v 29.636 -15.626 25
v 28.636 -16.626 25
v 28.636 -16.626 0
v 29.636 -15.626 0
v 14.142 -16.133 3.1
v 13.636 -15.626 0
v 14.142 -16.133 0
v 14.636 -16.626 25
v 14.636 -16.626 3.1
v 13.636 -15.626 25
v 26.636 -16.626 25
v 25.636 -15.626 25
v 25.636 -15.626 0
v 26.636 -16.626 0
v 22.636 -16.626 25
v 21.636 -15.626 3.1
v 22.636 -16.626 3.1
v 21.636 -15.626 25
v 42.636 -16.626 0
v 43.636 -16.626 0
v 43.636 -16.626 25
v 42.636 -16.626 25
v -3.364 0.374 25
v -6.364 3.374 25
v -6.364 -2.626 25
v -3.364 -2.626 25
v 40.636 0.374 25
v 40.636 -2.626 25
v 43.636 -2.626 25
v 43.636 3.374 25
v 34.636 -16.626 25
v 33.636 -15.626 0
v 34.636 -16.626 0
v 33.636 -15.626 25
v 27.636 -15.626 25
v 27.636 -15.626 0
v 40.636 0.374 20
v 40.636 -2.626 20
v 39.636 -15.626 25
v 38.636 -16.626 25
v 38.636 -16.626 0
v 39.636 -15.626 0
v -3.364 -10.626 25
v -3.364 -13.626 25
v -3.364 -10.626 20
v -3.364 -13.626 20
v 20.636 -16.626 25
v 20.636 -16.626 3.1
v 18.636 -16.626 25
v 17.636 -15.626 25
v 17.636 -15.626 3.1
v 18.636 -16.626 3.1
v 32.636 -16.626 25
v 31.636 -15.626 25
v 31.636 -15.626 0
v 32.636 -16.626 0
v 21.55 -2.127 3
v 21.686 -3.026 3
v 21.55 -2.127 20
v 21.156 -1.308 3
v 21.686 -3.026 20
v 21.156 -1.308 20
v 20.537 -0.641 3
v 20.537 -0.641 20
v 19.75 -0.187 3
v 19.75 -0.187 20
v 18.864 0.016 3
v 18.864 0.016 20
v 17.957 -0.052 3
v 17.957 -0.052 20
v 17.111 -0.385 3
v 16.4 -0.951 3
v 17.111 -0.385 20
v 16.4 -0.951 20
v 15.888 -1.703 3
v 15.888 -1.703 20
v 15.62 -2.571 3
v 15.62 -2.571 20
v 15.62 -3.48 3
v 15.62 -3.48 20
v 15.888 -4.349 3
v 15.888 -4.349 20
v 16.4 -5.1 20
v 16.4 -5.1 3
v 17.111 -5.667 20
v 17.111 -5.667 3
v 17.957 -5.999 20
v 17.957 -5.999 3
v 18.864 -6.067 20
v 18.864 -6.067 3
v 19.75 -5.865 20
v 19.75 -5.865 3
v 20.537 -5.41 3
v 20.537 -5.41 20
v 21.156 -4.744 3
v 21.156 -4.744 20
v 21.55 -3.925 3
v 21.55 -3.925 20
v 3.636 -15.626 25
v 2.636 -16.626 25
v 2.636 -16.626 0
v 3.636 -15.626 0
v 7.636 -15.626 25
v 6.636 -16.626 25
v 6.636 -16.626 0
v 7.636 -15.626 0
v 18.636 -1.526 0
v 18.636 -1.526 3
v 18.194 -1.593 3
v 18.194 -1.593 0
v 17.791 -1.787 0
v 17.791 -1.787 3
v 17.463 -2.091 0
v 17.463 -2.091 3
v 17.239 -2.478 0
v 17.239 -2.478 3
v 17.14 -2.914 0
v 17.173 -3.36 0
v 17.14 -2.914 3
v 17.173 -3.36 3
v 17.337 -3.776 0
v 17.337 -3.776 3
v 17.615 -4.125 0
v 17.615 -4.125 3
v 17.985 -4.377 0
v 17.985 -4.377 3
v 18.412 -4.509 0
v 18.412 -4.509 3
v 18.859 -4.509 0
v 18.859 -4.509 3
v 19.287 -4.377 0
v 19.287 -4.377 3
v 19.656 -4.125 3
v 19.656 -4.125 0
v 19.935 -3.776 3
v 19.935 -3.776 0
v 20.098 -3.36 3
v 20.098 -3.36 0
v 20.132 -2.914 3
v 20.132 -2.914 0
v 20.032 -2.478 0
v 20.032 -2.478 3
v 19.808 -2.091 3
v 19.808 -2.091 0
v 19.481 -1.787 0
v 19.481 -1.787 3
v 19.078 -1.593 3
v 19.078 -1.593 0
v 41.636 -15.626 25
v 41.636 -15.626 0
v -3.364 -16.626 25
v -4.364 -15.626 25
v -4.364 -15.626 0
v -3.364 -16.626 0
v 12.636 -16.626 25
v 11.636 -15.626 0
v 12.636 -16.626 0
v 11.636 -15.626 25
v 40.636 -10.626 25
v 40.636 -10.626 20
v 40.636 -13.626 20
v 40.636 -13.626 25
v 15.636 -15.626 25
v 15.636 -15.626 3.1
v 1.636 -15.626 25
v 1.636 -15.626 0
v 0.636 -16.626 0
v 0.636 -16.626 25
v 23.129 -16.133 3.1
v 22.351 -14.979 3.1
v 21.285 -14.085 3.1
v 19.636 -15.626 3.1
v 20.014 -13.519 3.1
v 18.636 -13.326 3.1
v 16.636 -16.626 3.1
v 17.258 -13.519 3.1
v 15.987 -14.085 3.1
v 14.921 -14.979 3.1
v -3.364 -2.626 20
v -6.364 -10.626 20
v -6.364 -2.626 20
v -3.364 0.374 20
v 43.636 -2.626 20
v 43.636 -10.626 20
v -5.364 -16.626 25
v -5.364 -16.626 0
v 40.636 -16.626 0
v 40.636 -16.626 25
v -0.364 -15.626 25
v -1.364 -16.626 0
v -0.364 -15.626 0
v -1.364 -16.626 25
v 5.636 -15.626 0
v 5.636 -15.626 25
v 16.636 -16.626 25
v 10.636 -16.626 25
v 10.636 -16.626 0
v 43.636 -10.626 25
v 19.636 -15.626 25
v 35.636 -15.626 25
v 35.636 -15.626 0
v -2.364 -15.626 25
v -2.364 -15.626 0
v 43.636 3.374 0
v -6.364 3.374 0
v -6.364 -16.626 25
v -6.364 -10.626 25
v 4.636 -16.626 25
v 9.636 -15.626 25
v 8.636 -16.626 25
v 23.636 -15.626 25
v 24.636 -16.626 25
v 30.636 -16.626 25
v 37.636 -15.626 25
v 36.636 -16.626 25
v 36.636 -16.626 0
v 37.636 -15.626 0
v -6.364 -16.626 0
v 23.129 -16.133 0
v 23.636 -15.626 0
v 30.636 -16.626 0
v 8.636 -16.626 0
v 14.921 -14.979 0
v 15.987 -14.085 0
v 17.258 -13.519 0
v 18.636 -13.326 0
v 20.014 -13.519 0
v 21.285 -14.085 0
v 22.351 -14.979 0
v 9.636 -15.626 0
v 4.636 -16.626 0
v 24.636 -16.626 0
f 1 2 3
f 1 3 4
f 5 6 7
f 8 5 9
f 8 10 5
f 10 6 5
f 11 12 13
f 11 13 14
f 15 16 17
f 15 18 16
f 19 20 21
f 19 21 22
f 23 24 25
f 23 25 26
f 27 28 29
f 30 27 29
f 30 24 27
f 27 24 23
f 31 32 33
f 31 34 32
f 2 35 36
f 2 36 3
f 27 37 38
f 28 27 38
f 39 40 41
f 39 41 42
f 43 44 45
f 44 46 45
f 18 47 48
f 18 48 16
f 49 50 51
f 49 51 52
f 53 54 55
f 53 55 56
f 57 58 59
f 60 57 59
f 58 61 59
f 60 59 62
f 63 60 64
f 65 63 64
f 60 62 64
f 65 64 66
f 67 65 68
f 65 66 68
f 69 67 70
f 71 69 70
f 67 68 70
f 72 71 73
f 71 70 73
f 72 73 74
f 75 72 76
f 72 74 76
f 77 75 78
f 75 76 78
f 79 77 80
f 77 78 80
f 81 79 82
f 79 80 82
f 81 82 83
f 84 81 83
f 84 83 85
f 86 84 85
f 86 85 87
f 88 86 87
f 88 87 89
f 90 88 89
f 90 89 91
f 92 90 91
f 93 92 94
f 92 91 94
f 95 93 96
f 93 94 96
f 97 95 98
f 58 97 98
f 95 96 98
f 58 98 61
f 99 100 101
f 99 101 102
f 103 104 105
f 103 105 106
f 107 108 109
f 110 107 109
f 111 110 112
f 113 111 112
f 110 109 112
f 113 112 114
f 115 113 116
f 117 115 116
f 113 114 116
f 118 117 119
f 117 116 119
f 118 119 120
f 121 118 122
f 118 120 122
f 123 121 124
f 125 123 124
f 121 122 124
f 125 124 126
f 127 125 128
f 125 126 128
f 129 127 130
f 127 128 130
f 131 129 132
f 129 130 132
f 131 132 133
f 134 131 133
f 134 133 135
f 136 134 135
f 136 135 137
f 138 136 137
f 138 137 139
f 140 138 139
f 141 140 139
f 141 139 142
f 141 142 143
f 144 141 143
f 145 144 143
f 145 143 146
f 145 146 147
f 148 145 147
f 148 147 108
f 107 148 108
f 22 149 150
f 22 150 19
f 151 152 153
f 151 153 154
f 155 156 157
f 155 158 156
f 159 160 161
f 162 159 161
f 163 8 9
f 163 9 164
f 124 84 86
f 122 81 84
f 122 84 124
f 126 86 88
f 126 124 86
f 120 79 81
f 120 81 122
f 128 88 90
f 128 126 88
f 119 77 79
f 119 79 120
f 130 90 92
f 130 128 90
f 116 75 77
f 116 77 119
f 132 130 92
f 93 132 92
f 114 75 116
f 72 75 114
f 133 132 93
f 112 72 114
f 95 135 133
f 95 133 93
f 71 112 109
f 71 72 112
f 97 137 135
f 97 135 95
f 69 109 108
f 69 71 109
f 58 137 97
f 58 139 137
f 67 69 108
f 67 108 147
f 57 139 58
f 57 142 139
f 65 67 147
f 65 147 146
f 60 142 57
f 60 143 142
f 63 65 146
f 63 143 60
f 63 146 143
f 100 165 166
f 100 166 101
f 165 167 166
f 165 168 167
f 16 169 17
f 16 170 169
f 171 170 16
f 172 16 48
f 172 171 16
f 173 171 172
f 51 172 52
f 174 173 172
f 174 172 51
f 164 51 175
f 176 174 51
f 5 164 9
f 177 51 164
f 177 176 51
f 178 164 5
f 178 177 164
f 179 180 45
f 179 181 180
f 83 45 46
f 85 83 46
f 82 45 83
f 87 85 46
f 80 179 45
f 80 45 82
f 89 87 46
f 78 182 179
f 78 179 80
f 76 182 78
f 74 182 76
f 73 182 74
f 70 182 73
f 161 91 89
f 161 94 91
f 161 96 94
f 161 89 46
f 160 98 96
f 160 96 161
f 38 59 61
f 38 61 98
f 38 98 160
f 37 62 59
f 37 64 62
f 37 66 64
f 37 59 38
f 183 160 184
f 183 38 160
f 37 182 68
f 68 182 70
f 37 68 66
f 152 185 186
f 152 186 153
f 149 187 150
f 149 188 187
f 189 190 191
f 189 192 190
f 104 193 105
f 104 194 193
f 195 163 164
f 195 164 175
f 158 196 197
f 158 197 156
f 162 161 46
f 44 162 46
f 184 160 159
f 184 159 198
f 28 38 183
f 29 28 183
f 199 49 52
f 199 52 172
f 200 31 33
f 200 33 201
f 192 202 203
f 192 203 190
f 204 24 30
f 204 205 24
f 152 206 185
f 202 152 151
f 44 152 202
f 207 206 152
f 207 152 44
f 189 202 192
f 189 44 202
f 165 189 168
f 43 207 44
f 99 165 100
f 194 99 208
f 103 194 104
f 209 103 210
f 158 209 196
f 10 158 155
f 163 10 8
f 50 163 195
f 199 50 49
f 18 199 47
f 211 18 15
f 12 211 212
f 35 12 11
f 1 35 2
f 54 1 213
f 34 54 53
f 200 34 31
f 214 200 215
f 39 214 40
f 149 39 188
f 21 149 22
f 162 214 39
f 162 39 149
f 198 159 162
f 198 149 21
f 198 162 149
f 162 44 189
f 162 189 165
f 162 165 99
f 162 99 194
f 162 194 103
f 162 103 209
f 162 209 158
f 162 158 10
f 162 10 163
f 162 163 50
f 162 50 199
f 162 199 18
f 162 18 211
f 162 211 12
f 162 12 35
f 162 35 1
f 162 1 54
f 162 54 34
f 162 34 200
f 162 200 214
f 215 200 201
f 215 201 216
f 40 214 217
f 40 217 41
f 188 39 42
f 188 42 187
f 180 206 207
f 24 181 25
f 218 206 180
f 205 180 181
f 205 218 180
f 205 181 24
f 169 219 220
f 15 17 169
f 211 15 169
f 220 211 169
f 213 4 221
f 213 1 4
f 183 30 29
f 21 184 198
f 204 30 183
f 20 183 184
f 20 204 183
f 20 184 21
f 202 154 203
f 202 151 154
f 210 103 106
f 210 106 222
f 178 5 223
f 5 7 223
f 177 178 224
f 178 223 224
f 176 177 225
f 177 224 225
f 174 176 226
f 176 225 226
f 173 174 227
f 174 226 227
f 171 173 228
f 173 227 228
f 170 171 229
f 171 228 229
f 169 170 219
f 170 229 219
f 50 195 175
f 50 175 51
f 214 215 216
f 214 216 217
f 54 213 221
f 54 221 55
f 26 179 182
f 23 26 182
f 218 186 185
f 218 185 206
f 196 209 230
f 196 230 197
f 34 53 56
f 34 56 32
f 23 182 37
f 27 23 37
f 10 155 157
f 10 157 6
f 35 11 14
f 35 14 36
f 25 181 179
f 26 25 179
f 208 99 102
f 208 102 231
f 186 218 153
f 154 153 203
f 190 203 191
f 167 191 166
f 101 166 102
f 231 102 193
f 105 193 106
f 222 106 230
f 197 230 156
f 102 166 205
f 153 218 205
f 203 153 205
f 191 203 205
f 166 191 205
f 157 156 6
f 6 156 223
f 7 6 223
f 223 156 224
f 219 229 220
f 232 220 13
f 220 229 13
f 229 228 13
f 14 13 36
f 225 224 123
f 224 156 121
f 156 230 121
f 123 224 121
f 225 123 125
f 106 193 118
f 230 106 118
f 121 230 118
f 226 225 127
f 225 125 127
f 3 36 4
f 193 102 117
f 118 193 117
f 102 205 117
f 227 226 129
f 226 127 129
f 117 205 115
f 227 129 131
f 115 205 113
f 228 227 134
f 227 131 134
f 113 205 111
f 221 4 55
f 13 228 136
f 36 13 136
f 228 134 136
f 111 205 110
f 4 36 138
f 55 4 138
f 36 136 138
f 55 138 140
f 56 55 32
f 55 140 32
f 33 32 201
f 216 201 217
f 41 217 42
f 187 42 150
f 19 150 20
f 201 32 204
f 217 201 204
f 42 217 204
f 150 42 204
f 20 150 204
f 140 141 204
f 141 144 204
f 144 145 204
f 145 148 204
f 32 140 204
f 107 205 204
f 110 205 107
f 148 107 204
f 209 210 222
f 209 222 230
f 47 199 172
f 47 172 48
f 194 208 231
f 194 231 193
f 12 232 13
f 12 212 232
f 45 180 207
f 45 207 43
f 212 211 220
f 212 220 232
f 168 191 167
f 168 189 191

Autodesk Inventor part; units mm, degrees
ref_plane "YZ Plane" through (0, 0, 0) normal (1, 0, 0) x (0, 1, 0)
ref_plane "XZ Plane" through (0, 0, 0) normal (0, 1, 0) x (-1, 0, 0)
ref_plane "XY Plane" through (0, 0, 0) normal (0, 0, 1) x (1, 0, 0)
sketch "Szkic1" plane through (0, 0, 0) normal (0, 0, 1) x (1, 0, 0)
  line L0 (-6.3643, 3.3741) -> (43.6357, 3.3741)
  line L1 (43.6357, 3.3741) -> (43.6357, -16.6259)
  line L2 (43.6357, -16.6259) -> (-6.3643, -16.6259)
  line L3 (-6.3643, -16.6259) -> (-6.3643, 3.3741)
  point P0 (0, 0)
  dimension "d0" = 50
  dimension "d1" = 20
extrude "Wyciągnięcie proste1" add sketch "Szkic1" along normal blind 20
sketch "Szkic2" plane through (0, 0, 20) normal (0, 0, 1) x (1, 0, 0)
  line L0 (43.6357, 3.3741) -> (-6.3643, 3.3741)
  line L1 (-6.3643, 3.3741) -> (-6.3643, -16.6259)
  line L2 (-6.3643, -16.6259) -> (43.6357, -16.6259)
  line L3 (43.6357, -16.6259) -> (43.6357, 3.3741)
  line L4 (-3.3643, 0.3741) -> (40.6357, 0.3741)
  line L5 (40.6357, -13.6259) -> (-3.3643, -13.6259)
  line L6 (-3.3643, -13.6259) -> (-3.3643, -10.6259)
  line L7 (-3.3643, -2.6259) -> (-3.3643, 0.3741)
  line L8 (-6.3643, -2.6259) -> (-3.3643, -2.6259)
  line L9 (40.6357, -2.6259) -> (43.6357, -2.6259)
  line L10 (-6.3643, -10.6259) -> (-3.3643, -10.6259)
  line L11 (40.6357, -10.6259) -> (43.6357, -10.6259)
  line L12 (40.6357, 0.3741) -> (40.6357, -2.6259)
  line L13 (40.6357, -10.6259) -> (40.6357, -13.6259)
  point P0 (0, 0)
  dimension "d4" = 3
  dimension "d7" = 6
  dimension "d8" = 6
  dimension "d9" = 6
  dimension "d10" = 6
  dimension "d11" = 3
  dimension "d12" = 3
  dimension "d13" = 3
  dimension "d14" = 3
extrude "Wyciągnięcie proste2" add sketch "Szkic2" along normal blind 5 contours L3 L9 L12 L4 L7 L8 L1 L0 | L3 L2 L1 L10 L6 L5 L13 L11
sketch "Szkic3" plane through (0, 0, 25) normal (0, 0, 1) x (1, 0, 0)
  line L0 (-6.3643, -16.6259) -> (43.6357, -16.6259)
  line L1 (43.6357, -16.6259) -> (43.6357, -10.6259)
  line L2 (43.6357, -10.6259) -> (40.6357, -10.6259)
  line L3 (40.6357, -10.6259) -> (40.6357, -13.6259)
  line L4 (40.6357, -13.6259) -> (-3.3643, -13.6259)
  line L5 (-3.3643, -13.6259) -> (-3.3643, -10.6259)
  line L6 (-3.3643, -10.6259) -> (-6.3643, -10.6259)
  line L7 (-6.3643, -10.6259) -> (-6.3643, -16.6259)
  line L8 (-6.3643, -16.6259) -> (43.6357, -16.6259)
  line L9 (-5.3643, -16.6259) -> (-3.3643, -16.6259)
  line L10 (-5.3643, -16.6259) -> (-4.3643, -15.6259)
  line L11 (-4.3643, -15.6259) -> (-3.3643, -16.6259)
  point P0 (0, 0)
  dimension "d17" = 2
  dimension "d18" = 1
  dimension "d19" = 1
extrude "Wyciągnięcie proste3" cut sketch "Szkic3" against normal through all contours L10 L11 L0
pattern_linear "Szyk prostokątny1" count 24 spacing 2 along (1, 0, 0) of "Wyciągnięcie proste3"
sketch "Szkic4" plane through (0, 0, 0) normal (0, 0, -1) x (-1, 0, 0)
  line L0 (-42.6357, -16.6259) -> (-41.6357, -15.6259)
  line L1 (-41.6357, -15.6259) -> (-40.6357, -16.6259)
  line L2 (-40.6357, -16.6259) -> (-39.6357, -15.6259)
  line L3 (-39.6357, -15.6259) -> (-38.6357, -16.6259)
  line L4 (-38.6357, -16.6259) -> (-37.6357, -15.6259)
  line L5 (-37.6357, -15.6259) -> (-36.6357, -16.6259)
  line L6 (-36.6357, -16.6259) -> (-35.6357, -15.6259)
  line L7 (-35.6357, -15.6259) -> (-34.6357, -16.6259)
  line L8 (-34.6357, -16.6259) -> (-33.6357, -15.6259)
  line L9 (-33.6357, -15.6259) -> (-32.6357, -16.6259)
  line L10 (-32.6357, -16.6259) -> (-31.6357, -15.6259)
  line L11 (-31.6357, -15.6259) -> (-30.6357, -16.6259)
  line L12 (-30.6357, -16.6259) -> (-29.6357, -15.6259)
  line L13 (-29.6357, -15.6259) -> (-28.6357, -16.6259)
  line L14 (-28.6357, -16.6259) -> (-27.6357, -15.6259)
  line L15 (-27.6357, -15.6259) -> (-26.6357, -16.6259)
  line L16 (-26.6357, -16.6259) -> (-25.6357, -15.6259)
  line L17 (-25.6357, -15.6259) -> (-24.6357, -16.6259)
  line L18 (-24.6357, -16.6259) -> (-23.6357, -15.6259)
  line L19 (-23.6357, -15.6259) -> (-22.6357, -16.6259)
  line L20 (-22.6357, -16.6259) -> (-21.6357, -15.6259)
  line L21 (-21.6357, -15.6259) -> (-20.6357, -16.6259)
  line L22 (-20.6357, -16.6259) -> (-19.6357, -15.6259)
  line L23 (-19.6357, -15.6259) -> (-18.6357, -16.6259)
  line L24 (-18.6357, -16.6259) -> (-17.6357, -15.6259)
  line L25 (-17.6357, -15.6259) -> (-16.6357, -16.6259)
  line L26 (-16.6357, -16.6259) -> (-15.6357, -15.6259)
  line L27 (-15.6357, -15.6259) -> (-14.6357, -16.6259)
  line L28 (-14.6357, -16.6259) -> (-13.6357, -15.6259)
  line L29 (-13.6357, -15.6259) -> (-12.6357, -16.6259)
  line L30 (-12.6357, -16.6259) -> (-11.6357, -15.6259)
  line L31 (-11.6357, -15.6259) -> (-10.6357, -16.6259)
  line L32 (-10.6357, -16.6259) -> (-9.6357, -15.6259)
  line L33 (-9.6357, -15.6259) -> (-8.6357, -16.6259)
  line L34 (-8.6357, -16.6259) -> (-7.6357, -15.6259)
  line L35 (-7.6357, -15.6259) -> (-6.6357, -16.6259)
  line L36 (-6.6357, -16.6259) -> (-5.6357, -15.6259)
  line L37 (-5.6357, -15.6259) -> (-4.6357, -16.6259)
  line L38 (-4.6357, -16.6259) -> (-3.6357, -15.6259)
  line L39 (-3.6357, -15.6259) -> (-2.6357, -16.6259)
  line L40 (-2.6357, -16.6259) -> (-1.6357, -15.6259)
  line L41 (-1.6357, -15.6259) -> (-0.6357, -16.6259)
  line L42 (-0.6357, -16.6259) -> (0.3643, -15.6259)
  line L43 (0.3643, -15.6259) -> (1.3643, -16.6259)
  line L44 (1.3643, -16.6259) -> (2.3643, -15.6259)
  line L45 (2.3643, -15.6259) -> (3.3643, -16.6259)
  line L46 (3.3643, -16.6259) -> (4.3643, -15.6259)
  line L47 (4.3643, -15.6259) -> (5.3643, -16.6259)
  line L48 (5.3643, -16.6259) -> (6.3643, -16.6259)
  line L49 (6.3643, -16.6259) -> (6.3643, 3.3741)
  line L50 (6.3643, 3.3741) -> (-43.6357, 3.3741)
  line L51 (-43.6357, 3.3741) -> (-43.6357, -16.6259)
  line L52 (-43.6357, -16.6259) -> (-42.6357, -16.6259)
  circle A0 centre (-18.6357, -18.3259) radius 5
  point P0 (0, 0)
  point P1 (-18.6357, -3.0259)
  dimension "d25" = 25
  dimension "d26" = 6.4
  dimension "d27" = 10
  dimension "d28" = 15.3
  dimension "d29" = 25
extrude "Wyciągnięcie proste4" cut sketch "Szkic4" against normal blind 3.1 contours A0 L28 L27 L26 L25 L24 L23 L22 L21 L20 L19 | L19 L20 L21 L22 L23 L24 L25 L26 L27 L28 A0
hole "Otwór1" at (18.6357, -3.0259, 0) direction (0, 0, 1) diameter 3 end through all
sketch "Szkic5" plane through (0, 0, 20) normal (0, 0, 1) x (1, 0, 0)
  circle A0 centre (18.6357, -3.0259) radius 1.5
  line L0 (-3.3643, -2.6259) -> (-6.3643, -2.6259)
  line L1 (-6.3643, -2.6259) -> (-6.3643, -10.6259)
  line L2 (-6.3643, -10.6259) -> (-3.3643, -10.6259)
  line L3 (-3.3643, -10.6259) -> (-3.3643, -13.6259)
  line L4 (-3.3643, -13.6259) -> (40.6357, -13.6259)
  line L5 (40.6357, -13.6259) -> (40.6357, -10.6259)
  line L6 (40.6357, -10.6259) -> (43.6357, -10.6259)
  line L7 (43.6357, -10.6259) -> (43.6357, -2.6259)
  line L8 (43.6357, -2.6259) -> (40.6357, -2.6259)
  line L9 (40.6357, -2.6259) -> (40.6357, 0.3741)
  line L10 (40.6357, 0.3741) -> (-3.3643, 0.3741)
  line L11 (-3.3643, 0.3741) -> (-3.3643, -2.6259)
  circle A1 centre (18.6357, -3.0259) radius 3.05
  point P0 (0, 0)
  dimension "d39" = 6.1
extrude "Wyciągnięcie proste5" cut sketch "Szkic5" against normal blind 17 contours A1
properties part number "3DP_ABS_Nozzle_Cleaner"
